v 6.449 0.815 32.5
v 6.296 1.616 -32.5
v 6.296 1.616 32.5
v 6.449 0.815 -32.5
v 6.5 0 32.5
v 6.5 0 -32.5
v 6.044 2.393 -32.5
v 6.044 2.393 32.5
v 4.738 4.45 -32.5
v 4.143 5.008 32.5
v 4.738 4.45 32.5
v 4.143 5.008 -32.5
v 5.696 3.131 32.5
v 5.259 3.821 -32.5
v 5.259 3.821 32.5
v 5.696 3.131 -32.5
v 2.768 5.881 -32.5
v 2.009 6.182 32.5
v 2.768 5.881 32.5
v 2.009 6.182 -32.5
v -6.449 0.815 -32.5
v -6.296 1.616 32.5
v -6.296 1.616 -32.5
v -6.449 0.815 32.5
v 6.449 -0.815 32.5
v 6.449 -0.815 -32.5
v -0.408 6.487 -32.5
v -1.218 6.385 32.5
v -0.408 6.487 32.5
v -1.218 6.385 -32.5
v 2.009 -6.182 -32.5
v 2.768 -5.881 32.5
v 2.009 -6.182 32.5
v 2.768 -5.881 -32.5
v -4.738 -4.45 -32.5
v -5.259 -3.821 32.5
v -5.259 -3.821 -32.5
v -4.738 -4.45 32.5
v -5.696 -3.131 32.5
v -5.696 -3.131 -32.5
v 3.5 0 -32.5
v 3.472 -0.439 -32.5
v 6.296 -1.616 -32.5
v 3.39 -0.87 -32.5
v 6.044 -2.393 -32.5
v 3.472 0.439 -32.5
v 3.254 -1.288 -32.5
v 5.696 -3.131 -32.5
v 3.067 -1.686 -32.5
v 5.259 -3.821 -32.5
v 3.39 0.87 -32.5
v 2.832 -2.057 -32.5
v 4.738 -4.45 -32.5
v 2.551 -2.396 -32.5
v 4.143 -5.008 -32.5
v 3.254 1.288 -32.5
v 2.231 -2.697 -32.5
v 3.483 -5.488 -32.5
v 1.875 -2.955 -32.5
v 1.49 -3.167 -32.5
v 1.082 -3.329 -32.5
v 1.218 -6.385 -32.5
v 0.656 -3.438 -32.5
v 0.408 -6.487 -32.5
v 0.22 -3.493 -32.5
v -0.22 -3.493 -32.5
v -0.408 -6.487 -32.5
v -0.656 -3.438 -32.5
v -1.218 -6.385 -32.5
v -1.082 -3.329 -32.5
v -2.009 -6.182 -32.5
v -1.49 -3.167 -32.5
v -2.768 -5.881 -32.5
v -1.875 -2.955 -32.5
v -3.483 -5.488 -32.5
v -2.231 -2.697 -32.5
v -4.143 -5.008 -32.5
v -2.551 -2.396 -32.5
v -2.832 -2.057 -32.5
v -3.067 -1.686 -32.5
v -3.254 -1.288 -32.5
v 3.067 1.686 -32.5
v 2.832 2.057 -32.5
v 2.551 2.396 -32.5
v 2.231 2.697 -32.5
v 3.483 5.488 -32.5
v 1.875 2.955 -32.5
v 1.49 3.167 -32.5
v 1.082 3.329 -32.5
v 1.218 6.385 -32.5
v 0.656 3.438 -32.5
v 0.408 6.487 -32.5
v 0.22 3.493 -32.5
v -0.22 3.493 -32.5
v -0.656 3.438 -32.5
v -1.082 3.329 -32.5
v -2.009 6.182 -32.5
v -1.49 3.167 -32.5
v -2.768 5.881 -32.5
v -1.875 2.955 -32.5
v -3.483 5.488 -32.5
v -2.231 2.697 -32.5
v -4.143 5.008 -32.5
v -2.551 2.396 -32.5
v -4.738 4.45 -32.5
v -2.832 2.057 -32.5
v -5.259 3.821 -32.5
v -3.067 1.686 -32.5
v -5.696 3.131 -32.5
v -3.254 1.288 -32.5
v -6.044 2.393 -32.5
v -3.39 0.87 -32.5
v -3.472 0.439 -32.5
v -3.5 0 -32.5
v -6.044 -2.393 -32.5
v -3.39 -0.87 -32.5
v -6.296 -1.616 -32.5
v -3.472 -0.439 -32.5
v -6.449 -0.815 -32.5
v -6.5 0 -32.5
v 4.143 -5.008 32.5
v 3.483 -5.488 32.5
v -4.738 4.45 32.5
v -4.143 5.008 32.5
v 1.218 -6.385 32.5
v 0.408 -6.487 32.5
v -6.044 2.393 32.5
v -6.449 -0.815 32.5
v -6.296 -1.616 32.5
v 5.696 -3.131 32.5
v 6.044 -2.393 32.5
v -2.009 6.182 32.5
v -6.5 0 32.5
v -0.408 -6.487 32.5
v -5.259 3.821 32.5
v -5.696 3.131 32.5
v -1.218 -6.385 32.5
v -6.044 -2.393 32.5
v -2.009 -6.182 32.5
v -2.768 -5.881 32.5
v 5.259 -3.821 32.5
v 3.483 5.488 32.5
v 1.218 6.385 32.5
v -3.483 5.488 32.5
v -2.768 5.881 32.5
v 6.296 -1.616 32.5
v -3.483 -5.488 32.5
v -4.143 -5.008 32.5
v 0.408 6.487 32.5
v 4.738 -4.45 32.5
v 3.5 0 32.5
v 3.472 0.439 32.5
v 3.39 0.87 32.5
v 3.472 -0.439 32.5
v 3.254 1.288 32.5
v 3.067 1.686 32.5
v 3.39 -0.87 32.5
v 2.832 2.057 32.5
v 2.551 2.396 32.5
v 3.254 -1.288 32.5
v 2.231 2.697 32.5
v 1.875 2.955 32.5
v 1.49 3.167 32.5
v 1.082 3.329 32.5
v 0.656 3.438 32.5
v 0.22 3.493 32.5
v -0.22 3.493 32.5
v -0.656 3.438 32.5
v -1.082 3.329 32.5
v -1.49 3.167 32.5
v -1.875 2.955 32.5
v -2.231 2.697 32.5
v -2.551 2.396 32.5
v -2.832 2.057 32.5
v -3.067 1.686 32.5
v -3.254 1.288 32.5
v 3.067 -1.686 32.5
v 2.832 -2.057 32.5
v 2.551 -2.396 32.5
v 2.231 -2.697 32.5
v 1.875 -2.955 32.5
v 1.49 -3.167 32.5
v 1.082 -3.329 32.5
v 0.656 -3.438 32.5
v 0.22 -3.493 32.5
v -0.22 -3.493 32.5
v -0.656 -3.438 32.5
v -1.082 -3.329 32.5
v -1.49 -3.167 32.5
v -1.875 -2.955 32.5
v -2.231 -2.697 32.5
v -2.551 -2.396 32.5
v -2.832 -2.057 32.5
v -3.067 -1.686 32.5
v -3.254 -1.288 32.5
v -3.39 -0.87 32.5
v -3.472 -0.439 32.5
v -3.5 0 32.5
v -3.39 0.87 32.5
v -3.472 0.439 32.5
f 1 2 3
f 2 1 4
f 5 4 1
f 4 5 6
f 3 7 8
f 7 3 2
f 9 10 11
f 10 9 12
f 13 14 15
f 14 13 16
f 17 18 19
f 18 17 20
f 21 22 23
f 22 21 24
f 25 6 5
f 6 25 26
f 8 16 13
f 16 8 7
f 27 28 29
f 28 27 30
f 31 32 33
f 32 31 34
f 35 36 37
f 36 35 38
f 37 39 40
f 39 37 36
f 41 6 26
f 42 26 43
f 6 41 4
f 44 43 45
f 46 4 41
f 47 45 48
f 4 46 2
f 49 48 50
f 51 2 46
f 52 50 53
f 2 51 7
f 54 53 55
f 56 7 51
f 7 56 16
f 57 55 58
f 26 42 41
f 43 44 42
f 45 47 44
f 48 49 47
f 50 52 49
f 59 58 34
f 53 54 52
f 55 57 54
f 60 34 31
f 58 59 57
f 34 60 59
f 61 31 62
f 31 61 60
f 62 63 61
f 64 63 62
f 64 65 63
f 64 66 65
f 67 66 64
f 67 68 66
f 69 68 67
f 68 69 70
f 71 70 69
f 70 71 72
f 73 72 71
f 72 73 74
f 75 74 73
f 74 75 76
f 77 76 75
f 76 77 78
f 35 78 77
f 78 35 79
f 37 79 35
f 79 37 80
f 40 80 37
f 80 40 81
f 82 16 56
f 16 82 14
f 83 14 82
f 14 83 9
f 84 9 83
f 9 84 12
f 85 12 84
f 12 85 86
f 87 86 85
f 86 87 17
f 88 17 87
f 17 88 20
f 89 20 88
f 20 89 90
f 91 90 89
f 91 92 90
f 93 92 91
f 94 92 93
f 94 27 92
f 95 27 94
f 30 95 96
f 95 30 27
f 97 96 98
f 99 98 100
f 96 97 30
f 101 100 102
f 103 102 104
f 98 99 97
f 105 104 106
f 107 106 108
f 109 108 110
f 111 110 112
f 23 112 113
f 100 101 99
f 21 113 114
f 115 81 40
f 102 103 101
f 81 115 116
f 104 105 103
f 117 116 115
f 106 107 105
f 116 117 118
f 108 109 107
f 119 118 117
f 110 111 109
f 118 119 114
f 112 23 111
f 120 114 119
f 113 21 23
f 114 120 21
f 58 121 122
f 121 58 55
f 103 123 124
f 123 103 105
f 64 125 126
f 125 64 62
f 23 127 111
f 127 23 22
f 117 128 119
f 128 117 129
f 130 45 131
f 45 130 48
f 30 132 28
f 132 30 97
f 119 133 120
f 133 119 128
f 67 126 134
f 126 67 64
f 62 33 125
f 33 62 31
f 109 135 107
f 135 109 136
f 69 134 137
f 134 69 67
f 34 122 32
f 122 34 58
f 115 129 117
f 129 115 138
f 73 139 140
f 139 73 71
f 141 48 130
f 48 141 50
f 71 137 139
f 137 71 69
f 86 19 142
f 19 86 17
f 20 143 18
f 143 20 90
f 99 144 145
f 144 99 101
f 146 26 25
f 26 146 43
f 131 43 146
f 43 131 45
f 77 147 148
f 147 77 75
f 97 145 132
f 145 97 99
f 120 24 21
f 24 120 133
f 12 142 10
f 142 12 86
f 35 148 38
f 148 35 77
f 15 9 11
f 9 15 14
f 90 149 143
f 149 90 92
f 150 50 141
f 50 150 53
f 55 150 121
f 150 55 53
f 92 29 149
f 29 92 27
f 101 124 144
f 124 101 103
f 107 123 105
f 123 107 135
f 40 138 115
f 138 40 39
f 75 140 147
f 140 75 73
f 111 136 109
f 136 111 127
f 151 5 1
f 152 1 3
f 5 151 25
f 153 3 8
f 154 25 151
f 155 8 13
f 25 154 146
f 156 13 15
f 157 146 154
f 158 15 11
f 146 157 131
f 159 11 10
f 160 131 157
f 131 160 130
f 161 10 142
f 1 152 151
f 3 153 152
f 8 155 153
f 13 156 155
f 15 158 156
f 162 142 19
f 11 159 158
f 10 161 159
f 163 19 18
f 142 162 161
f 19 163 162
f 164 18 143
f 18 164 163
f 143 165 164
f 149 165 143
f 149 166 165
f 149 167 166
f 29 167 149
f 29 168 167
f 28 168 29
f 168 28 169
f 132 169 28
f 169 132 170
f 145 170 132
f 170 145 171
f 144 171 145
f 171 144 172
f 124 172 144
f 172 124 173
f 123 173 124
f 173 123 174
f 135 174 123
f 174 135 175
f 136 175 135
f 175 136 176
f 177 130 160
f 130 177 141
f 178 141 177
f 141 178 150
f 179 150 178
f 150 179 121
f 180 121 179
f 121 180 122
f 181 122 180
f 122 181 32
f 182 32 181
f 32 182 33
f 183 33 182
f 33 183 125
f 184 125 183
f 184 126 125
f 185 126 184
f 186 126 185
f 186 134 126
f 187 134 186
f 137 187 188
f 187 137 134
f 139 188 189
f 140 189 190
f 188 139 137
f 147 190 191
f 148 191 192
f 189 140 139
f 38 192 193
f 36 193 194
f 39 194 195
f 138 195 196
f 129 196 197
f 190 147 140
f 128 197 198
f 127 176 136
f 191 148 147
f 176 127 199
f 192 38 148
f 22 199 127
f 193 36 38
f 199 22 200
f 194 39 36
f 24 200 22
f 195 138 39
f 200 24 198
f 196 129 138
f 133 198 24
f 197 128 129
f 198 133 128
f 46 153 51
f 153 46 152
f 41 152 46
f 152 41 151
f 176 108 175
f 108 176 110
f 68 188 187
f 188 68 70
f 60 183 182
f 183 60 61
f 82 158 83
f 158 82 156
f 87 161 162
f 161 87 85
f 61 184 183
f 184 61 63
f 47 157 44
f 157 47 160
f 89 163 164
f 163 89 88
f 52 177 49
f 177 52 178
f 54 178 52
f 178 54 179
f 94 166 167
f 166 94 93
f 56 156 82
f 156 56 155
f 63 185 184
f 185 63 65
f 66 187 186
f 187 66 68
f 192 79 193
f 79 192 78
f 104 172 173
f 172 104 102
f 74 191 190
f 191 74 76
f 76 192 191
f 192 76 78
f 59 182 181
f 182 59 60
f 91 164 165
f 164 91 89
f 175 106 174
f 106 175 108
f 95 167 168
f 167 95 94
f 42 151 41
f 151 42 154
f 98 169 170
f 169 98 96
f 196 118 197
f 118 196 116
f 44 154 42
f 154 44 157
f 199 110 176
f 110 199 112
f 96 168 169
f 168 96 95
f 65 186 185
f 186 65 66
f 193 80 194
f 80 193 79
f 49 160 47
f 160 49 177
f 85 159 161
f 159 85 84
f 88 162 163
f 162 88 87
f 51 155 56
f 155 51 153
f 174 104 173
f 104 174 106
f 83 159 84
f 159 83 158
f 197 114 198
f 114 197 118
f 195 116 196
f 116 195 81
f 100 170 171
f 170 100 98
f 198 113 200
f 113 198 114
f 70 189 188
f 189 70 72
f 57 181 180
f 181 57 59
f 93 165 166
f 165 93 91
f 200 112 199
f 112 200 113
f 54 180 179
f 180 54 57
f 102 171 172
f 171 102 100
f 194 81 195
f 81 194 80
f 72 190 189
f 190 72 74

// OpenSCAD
$fn = 50;


difference() {
	union() {
		translate(v = [0, 0, -32.5000000000]) {
			cylinder(h = 65, r = 6.5000000000);
		}
	}
	union() {
		translate(v = [0, 0, -100.0000000000]) {
			cylinder(h = 200, r = 3.5000000000);
		}
	}
}
